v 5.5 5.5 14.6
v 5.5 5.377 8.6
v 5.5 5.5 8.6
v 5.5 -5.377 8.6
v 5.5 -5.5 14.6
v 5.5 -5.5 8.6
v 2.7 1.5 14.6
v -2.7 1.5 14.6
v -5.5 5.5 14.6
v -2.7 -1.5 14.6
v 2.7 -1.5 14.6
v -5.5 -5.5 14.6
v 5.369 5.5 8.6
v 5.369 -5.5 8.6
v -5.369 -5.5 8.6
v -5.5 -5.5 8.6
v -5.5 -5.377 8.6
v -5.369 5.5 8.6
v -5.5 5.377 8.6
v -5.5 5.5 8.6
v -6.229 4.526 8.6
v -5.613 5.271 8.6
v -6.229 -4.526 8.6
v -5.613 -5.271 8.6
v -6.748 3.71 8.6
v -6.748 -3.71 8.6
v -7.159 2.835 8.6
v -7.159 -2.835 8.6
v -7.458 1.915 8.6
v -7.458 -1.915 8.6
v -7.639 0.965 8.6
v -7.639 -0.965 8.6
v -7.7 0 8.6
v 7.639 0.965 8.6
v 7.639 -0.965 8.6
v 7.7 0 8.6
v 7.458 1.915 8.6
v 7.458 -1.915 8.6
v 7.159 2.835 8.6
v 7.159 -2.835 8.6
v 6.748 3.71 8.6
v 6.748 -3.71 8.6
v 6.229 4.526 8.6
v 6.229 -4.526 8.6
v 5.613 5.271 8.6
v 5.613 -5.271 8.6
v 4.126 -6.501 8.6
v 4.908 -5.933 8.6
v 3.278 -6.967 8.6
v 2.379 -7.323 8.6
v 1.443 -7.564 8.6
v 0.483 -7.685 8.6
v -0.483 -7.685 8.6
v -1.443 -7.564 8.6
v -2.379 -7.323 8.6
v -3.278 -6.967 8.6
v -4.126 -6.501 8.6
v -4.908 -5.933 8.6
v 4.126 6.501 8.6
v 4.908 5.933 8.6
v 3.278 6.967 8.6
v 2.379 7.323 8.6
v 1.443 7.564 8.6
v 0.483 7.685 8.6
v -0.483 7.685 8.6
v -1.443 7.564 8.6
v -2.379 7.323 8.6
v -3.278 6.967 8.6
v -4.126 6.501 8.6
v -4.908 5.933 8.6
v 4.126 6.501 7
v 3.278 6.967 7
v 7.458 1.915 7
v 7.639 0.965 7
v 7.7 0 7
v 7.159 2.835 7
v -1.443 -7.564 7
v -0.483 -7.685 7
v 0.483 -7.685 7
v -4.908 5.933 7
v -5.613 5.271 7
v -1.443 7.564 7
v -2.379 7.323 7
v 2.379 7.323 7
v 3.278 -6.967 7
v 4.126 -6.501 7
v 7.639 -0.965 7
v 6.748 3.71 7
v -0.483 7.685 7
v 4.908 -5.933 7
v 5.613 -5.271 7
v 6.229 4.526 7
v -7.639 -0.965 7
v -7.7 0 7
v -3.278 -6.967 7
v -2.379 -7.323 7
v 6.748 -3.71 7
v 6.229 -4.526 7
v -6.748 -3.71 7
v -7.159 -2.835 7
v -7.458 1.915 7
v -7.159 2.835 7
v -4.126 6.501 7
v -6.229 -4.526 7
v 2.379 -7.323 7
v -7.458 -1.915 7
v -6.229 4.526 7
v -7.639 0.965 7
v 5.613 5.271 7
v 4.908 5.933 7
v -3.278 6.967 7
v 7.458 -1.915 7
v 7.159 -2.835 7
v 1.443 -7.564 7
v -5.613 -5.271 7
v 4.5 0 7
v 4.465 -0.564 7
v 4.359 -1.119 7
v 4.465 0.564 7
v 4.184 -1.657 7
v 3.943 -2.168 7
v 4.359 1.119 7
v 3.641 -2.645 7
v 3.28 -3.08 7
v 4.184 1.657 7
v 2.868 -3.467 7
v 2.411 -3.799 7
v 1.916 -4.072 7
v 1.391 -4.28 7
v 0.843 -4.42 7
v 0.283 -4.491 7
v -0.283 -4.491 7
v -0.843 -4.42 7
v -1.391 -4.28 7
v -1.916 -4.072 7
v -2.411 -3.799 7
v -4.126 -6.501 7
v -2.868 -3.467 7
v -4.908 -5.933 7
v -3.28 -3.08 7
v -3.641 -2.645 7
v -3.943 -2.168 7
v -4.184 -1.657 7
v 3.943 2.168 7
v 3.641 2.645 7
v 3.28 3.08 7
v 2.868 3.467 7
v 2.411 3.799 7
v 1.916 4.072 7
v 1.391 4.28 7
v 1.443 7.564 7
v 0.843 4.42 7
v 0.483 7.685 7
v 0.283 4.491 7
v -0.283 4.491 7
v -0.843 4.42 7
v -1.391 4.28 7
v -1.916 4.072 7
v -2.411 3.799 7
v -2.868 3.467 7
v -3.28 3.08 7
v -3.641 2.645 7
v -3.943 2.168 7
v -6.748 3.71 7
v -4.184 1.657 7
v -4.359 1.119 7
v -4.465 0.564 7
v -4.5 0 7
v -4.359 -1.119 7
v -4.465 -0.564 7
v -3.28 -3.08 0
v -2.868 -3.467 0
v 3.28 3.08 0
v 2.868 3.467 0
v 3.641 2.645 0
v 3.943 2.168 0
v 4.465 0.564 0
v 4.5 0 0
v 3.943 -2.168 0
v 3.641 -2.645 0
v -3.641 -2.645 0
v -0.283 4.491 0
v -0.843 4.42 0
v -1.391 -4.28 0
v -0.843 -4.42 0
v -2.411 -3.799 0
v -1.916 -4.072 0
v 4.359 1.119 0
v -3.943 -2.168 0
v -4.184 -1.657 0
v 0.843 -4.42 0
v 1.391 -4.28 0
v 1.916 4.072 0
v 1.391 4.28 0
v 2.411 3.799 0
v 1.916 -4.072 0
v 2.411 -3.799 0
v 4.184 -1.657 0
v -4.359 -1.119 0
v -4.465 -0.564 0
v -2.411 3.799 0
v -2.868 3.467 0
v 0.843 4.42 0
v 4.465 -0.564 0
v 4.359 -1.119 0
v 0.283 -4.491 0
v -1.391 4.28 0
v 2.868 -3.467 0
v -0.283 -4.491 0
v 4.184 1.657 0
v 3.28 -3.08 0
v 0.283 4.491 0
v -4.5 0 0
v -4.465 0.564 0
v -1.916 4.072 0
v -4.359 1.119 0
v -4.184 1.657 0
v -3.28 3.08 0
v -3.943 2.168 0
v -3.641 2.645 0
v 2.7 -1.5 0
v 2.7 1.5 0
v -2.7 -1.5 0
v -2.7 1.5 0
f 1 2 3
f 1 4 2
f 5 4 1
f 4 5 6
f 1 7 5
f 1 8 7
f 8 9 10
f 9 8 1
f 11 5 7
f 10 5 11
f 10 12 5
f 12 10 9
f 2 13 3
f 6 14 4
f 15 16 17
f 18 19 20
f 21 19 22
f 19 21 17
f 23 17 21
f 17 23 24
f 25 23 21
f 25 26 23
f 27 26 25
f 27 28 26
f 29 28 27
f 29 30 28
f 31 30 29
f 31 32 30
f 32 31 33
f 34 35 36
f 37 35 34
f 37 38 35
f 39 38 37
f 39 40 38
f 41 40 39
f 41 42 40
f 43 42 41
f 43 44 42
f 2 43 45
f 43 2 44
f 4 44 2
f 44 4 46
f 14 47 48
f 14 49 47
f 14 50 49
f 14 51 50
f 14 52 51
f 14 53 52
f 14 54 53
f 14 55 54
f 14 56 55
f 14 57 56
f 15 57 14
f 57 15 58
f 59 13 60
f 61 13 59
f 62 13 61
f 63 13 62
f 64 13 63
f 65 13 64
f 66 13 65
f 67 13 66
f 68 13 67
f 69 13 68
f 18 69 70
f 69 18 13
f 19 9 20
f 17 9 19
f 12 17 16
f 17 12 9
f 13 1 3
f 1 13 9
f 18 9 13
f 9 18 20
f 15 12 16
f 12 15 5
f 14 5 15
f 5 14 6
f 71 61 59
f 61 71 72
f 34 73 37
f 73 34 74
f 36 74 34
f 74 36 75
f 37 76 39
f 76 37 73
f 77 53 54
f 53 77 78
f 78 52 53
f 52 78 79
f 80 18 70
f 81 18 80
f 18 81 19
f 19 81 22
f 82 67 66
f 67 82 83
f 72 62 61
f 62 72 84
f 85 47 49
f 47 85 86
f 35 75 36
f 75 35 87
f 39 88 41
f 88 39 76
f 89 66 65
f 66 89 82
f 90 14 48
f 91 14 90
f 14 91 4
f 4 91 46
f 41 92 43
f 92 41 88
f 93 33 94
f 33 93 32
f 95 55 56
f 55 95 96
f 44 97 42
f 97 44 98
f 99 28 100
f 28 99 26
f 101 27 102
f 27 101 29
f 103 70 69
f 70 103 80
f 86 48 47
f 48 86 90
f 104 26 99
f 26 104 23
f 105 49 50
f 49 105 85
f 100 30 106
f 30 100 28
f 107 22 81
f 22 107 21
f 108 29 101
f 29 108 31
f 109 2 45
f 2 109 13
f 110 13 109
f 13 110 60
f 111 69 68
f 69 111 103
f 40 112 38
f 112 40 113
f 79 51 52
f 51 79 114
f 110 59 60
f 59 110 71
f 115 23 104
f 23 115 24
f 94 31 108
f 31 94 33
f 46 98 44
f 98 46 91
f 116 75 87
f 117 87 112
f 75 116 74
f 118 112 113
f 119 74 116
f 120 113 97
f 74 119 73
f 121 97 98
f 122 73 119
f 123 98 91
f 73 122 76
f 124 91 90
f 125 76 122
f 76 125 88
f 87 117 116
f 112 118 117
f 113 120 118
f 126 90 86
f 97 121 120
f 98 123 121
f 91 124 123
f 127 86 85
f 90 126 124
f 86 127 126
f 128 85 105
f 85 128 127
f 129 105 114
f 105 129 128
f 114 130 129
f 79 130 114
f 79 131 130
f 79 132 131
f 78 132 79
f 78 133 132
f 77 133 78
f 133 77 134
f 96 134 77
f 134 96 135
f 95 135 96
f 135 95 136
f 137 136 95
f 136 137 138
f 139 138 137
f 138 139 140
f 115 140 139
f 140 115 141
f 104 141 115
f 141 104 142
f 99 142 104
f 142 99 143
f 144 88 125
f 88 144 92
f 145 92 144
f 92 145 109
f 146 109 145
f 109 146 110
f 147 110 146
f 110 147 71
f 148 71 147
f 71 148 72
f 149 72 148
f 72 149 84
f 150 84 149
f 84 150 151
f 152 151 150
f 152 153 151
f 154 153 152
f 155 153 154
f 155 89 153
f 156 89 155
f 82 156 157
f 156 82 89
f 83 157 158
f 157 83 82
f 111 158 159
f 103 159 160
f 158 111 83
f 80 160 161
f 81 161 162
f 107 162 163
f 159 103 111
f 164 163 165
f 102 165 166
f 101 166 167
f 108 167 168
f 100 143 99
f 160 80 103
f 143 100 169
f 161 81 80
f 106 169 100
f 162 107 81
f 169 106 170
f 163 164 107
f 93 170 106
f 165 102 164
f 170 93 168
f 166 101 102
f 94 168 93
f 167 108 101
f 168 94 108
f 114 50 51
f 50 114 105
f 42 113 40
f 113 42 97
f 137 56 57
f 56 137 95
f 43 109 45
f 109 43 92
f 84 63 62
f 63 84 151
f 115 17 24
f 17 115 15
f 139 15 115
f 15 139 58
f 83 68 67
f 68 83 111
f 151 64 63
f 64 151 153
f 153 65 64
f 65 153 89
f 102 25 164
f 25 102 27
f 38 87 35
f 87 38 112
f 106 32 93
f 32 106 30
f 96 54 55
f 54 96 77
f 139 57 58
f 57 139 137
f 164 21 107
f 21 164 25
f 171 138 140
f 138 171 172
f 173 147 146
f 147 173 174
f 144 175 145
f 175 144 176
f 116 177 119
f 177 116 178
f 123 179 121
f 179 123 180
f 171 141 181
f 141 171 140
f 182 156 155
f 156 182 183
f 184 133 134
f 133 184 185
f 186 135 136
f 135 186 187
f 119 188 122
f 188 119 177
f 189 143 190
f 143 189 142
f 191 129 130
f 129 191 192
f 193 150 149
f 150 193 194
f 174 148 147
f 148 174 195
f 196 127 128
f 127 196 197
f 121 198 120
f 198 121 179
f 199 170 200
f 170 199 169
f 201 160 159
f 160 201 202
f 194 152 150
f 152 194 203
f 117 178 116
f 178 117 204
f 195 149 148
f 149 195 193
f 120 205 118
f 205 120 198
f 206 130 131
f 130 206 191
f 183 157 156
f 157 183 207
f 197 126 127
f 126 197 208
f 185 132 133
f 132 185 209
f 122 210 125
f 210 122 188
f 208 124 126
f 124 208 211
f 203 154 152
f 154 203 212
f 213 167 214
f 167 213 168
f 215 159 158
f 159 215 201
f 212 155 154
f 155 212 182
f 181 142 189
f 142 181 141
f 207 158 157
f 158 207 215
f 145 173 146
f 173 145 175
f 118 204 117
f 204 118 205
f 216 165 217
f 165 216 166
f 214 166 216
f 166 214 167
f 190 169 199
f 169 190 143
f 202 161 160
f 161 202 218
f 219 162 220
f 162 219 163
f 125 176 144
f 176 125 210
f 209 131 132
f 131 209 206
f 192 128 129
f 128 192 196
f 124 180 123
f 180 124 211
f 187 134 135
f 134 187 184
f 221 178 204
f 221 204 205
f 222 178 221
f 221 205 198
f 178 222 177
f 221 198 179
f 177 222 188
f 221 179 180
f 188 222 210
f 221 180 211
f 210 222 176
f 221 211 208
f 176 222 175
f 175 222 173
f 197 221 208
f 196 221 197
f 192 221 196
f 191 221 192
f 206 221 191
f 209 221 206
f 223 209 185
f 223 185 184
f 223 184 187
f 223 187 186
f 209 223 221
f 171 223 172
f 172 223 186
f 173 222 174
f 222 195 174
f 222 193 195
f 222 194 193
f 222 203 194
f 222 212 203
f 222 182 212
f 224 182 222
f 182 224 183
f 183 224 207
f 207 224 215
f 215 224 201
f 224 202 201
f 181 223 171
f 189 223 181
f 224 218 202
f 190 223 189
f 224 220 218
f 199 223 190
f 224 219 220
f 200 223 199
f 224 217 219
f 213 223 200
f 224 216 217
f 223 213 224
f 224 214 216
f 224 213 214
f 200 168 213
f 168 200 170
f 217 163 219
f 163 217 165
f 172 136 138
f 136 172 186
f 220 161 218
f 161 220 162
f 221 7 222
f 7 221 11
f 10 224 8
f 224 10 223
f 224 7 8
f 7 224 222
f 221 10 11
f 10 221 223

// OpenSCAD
$fn=50;

difference() {

    union() {
        translate([-5.5,-5.5,8.6]) {
            cube([11,11,6]);
        }

        translate([0, 0, 7]) {
            cylinder(h=1.6, d=15.4);
        }

        cylinder(h=7, d=9);
    }
    
    cube([5.4,3,40], center = true);

}
